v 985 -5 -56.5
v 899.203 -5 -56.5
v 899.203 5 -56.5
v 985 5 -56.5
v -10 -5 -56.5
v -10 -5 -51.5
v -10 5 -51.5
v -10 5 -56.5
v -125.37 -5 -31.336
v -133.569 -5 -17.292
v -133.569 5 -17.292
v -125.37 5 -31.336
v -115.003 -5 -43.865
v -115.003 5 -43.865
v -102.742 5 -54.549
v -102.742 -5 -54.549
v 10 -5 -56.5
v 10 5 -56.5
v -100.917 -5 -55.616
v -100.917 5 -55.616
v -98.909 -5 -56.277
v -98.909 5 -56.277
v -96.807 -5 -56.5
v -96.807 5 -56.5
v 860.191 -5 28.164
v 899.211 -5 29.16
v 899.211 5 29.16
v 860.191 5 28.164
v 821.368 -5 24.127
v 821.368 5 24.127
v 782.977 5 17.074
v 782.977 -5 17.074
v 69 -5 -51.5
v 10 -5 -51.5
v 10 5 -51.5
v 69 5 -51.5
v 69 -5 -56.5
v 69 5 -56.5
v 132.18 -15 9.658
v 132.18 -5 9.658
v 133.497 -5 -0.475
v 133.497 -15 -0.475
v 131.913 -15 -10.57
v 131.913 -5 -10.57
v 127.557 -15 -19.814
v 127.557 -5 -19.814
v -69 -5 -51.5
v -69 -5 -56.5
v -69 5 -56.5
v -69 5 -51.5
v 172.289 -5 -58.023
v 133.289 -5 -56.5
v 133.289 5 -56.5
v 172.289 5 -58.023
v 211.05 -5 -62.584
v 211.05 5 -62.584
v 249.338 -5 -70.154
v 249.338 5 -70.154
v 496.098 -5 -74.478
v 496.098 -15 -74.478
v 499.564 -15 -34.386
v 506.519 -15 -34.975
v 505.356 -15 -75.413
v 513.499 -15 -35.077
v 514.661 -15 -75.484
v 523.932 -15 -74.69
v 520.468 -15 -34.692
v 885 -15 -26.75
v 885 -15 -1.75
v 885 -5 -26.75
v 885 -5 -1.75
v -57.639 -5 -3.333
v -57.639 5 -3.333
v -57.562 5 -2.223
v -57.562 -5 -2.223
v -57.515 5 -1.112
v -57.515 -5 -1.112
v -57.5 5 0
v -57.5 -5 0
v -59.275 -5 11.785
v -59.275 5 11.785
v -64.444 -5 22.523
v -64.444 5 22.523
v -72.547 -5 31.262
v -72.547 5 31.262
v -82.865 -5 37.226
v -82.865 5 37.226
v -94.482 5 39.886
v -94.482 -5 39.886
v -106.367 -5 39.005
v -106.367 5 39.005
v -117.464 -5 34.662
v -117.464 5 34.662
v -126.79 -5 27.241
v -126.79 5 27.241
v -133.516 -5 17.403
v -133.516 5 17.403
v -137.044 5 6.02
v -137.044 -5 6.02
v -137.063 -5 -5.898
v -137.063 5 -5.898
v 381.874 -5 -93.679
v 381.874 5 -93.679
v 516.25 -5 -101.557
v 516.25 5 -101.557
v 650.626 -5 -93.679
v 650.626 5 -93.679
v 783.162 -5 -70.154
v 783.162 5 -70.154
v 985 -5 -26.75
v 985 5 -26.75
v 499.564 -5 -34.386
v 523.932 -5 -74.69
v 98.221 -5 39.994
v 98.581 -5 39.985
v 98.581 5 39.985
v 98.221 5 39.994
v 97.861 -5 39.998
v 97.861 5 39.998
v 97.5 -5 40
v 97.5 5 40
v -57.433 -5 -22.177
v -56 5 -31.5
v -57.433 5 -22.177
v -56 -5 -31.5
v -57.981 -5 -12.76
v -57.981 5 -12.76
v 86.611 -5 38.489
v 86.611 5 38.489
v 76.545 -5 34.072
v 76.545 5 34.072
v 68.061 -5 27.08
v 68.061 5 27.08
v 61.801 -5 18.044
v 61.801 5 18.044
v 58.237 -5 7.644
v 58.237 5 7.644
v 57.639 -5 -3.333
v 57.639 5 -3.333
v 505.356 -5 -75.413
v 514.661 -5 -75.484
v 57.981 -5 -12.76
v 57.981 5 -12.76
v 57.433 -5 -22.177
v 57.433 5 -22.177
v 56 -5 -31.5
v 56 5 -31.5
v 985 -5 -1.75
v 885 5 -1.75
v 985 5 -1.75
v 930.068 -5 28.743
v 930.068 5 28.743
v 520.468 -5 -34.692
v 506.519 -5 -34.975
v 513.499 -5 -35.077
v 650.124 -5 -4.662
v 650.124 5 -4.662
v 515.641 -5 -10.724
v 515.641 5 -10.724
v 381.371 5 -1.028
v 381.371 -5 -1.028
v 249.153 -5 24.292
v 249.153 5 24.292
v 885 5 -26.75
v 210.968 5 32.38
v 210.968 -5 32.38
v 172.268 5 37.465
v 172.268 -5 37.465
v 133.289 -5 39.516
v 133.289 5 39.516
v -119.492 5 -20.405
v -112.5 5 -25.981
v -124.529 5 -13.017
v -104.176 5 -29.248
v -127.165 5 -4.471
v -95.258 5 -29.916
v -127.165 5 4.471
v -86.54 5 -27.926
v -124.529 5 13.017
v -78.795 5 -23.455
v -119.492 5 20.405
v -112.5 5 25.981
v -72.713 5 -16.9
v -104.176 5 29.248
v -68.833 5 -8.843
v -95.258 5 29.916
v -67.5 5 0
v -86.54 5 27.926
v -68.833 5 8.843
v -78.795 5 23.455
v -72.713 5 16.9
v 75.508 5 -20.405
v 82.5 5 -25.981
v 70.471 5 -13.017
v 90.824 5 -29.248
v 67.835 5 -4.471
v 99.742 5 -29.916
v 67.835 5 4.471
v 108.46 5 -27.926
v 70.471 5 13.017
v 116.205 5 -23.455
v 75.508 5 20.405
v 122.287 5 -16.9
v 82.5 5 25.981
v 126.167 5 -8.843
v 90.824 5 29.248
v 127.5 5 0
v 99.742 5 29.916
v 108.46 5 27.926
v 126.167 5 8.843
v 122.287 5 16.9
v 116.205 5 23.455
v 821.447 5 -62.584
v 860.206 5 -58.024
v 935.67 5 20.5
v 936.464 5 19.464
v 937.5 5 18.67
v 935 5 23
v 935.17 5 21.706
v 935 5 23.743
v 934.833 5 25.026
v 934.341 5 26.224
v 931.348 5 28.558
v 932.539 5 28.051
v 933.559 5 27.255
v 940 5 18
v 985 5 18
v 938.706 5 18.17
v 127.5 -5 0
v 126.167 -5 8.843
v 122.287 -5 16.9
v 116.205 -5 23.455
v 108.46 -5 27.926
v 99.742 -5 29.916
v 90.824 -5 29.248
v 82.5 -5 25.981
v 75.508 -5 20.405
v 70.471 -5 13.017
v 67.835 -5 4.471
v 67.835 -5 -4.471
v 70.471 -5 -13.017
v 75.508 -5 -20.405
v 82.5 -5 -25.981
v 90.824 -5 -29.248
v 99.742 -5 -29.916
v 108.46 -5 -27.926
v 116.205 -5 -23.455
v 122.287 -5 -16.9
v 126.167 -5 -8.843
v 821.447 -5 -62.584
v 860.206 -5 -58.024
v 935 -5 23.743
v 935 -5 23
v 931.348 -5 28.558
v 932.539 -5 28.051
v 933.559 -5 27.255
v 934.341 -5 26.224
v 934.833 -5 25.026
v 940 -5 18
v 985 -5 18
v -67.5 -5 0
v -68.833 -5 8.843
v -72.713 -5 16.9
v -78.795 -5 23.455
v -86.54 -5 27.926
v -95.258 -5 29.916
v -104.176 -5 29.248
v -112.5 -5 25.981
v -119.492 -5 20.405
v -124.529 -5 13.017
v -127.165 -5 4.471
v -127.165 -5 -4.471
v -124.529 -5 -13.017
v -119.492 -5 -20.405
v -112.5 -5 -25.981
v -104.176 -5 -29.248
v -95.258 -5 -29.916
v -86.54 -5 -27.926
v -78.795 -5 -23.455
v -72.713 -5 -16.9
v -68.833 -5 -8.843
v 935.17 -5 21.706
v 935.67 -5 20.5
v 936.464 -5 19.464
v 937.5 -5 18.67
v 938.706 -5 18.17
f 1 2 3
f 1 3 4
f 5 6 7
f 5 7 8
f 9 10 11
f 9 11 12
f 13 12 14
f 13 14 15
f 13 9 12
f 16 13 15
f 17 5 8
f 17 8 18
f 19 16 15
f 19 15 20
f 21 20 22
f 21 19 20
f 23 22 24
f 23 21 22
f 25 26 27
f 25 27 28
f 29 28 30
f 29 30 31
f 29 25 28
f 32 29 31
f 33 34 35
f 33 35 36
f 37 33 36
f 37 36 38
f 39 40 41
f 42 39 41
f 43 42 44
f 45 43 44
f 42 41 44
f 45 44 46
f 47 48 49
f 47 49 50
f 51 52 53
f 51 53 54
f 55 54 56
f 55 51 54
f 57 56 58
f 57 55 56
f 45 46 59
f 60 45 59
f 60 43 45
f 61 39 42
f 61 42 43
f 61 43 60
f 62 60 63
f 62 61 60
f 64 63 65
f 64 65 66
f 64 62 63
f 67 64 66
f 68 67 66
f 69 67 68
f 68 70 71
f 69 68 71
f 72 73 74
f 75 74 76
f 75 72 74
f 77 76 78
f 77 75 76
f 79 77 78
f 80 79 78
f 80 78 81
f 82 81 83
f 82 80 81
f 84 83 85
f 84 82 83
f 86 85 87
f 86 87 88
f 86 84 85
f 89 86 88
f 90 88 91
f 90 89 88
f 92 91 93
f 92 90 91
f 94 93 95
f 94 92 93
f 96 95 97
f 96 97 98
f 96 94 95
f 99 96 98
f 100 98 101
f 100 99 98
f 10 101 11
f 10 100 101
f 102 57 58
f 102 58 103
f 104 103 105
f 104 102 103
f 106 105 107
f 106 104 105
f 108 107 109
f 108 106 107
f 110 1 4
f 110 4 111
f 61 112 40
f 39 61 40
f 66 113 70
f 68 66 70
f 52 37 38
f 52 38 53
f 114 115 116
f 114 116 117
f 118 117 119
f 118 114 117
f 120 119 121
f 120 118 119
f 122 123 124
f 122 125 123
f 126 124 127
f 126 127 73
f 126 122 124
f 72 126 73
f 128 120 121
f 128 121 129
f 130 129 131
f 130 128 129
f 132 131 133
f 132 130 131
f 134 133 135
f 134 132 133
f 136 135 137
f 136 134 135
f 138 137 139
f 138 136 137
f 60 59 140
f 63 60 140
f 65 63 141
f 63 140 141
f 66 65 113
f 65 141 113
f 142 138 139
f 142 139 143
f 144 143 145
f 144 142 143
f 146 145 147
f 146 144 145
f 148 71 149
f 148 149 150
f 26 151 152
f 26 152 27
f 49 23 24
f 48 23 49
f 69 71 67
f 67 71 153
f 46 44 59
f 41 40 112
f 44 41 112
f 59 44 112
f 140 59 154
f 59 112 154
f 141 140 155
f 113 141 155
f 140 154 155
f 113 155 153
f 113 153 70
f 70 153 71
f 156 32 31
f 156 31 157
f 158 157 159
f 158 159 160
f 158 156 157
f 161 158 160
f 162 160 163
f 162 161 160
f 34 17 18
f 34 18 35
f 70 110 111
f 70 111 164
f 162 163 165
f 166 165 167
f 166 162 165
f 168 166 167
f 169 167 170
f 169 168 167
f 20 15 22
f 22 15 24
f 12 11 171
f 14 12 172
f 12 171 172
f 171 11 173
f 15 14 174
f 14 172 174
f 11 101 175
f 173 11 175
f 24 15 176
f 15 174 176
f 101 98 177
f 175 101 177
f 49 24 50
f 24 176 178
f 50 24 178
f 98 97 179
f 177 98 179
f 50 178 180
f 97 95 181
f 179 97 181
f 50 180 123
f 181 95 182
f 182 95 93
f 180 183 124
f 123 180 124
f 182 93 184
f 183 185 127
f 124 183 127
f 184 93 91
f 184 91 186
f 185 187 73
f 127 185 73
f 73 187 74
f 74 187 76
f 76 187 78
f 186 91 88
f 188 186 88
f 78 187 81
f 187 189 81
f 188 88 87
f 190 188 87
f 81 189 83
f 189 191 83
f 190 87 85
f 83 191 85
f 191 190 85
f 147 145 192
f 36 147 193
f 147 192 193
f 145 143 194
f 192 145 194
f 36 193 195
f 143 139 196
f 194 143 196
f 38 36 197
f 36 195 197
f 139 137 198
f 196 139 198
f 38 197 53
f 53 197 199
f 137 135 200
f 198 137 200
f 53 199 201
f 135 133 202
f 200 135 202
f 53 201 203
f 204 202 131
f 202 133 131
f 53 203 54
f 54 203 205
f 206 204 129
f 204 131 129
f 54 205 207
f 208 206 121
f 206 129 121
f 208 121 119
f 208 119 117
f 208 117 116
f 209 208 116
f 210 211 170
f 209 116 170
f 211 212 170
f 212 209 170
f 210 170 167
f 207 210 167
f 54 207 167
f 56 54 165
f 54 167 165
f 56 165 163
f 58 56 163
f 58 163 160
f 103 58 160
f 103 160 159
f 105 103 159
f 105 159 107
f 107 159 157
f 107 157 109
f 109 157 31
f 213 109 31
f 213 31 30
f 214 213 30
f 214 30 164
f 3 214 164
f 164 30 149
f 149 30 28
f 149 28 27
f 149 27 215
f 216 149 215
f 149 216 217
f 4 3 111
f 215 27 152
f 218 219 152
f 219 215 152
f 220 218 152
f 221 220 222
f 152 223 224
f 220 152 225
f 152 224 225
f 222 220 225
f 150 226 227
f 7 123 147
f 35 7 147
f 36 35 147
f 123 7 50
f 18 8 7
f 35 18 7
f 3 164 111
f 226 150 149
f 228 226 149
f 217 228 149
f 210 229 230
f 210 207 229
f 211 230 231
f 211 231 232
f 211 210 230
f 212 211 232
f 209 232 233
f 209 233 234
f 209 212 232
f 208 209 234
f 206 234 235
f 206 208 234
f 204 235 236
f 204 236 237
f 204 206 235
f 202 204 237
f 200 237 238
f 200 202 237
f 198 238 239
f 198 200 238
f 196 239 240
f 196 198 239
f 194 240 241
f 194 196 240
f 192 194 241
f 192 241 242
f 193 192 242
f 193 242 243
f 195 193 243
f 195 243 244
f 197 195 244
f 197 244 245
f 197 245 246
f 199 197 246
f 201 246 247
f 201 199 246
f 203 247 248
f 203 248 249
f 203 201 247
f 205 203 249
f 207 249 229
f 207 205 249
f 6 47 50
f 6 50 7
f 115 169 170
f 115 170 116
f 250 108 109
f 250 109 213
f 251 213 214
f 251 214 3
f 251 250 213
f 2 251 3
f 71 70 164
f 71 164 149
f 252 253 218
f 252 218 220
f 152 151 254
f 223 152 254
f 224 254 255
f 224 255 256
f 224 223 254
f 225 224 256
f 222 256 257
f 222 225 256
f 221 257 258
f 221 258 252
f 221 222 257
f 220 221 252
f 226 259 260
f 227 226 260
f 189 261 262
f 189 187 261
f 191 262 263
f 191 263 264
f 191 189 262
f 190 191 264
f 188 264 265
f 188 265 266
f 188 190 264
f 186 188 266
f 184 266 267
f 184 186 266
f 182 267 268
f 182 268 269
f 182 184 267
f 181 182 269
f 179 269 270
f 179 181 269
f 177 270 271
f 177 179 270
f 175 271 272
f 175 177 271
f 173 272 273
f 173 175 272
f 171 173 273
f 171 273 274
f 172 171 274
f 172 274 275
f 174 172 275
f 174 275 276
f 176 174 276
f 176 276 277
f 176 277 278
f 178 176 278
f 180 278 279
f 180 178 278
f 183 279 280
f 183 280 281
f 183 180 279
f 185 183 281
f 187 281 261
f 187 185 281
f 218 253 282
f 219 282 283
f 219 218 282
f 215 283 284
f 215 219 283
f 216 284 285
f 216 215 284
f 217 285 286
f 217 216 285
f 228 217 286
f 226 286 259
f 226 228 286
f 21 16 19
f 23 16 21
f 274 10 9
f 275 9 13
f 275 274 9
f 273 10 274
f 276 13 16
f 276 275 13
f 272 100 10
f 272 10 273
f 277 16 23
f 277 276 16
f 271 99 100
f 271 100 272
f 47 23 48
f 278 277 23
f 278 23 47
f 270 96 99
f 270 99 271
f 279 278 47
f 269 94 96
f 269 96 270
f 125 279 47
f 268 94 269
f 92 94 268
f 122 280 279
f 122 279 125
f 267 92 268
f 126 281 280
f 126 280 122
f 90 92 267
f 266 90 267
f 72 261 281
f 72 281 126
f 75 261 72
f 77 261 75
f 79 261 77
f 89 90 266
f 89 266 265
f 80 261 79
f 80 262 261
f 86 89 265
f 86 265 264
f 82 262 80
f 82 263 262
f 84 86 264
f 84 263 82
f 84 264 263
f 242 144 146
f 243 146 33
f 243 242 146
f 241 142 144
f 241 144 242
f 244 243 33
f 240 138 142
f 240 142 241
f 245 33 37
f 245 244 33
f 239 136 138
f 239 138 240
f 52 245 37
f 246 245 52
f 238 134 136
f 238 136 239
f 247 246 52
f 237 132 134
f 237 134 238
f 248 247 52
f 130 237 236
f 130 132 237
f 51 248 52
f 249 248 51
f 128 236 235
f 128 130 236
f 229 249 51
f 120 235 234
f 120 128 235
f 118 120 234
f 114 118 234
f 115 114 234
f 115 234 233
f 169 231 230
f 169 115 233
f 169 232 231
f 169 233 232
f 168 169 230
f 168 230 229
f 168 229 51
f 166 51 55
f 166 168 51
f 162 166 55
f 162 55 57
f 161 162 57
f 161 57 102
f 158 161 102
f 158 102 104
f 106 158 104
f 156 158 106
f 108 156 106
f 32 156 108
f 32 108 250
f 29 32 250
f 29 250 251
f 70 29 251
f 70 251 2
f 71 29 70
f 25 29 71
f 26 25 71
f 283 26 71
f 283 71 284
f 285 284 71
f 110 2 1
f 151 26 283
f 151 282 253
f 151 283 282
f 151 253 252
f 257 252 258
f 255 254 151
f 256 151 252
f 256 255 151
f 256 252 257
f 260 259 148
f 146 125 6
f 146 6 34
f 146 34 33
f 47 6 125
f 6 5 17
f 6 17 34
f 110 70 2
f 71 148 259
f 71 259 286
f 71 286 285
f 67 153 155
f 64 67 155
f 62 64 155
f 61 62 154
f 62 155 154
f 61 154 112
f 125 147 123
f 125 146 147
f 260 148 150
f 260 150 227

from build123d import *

# Parameters (mm, degrees)
F0_R     = 30
F1_DEPTH = 5
F3_DEPTH = 10
F4_W     = 50
F4_H     = 52.275077
F5_DEPTH = 25
F6_R     = 5


with BuildPart() as f1:
    # F0 (on Front) → F1 (new body, symmetric)
    with BuildSketch(Plane.XZ):
        with BuildLine():
            ThreePointArc((-57.639096, -3.332913), (-57.534789, -1.667907), (-57.5, 0))
            ThreePointArc((-57.5, 0), (-106.366531, 39.004931), (-133.569231, -17.291922))
            ThreePointArc((-133.569231, -17.291922), (-90.267595, -39.340721), (-57.639096, -3.332913))
        make_face()
        with Locations((-97.5, 0)):
            Circle(F0_R, mode=Mode.SUBTRACT)
        with BuildLine():
            ThreePointArc((98.581492, 39.985377), (98.040796, 39.996344), (97.5, 40))
            Line((97.5, 40), (98.581492, 39.985377))
        make_face()
        with BuildLine():
            ThreePointArc((97.5, 40), (68.06094, 27.080283), (57.639096, -3.332913))
            ThreePointArc((57.639096, -3.332913), (99.167907, -39.965211), (137.5, 0))
            ThreePointArc((137.5, 0), (126.164086, 27.899286), (98.581492, 39.985377))
            Line((98.581492, 39.985377), (97.5, 40))
        make_face()
        with Locations((97.5, 0)):
            Circle(F0_R, mode=Mode.SUBTRACT)
        with BuildLine():
            ThreePointArc((-57.639096, -3.332913), (-90.267595, -39.340721), (-133.569231, -17.291922))
            ThreePointArc((-133.569231, -17.291922), (-120.441501, -37.81174), (-102.741898, -54.548654))
            ThreePointArc((-102.741898, -54.548654), (-99.9309, -55.999646), (-96.807324, -56.5))
            Line((-96.807324, -56.5), (-69, -56.5))
            Line((-69, -56.5), (-69, -51.5))
            Line((-69, -51.5), (-10, -51.5))
            Line((-10, -51.5), (-10, -56.5))
            Line((-10, -56.5), (0, -56.5))
            Line((0, -56.5), (0, -31.5))
            Line((0, -31.5), (-56, -31.5))
            ThreePointArc((-56, -31.5), (-57.817949, -17.474555), (-57.639096, -3.332913))
        make_face()
        with BuildLine():
            Line((56, -31.5), (0, -31.5))
            Line((0, -31.5), (0, -56.5))
            Line((0, -56.5), (10, -56.5))
            Line((10, -56.5), (10, -51.5))
            Line((10, -51.5), (69, -51.5))
            Line((69, -51.5), (69, -56.5))
            Line((69, -56.5), (133.289386, -56.5))
            ThreePointArc((133.289386, -56.5), (191.713948, -59.925161), (249.338057, -70.153718))
            ThreePointArc((249.338057, -70.153718), (516.25, -101.55727), (783.161943, -70.153718))
            ThreePointArc((783.161943, -70.153718), (840.782267, -59.925607), (899.202992, -56.5))
            Line((899.202992, -56.5), (985, -56.5))
            Line((985, -56.5), (985, -26.75))
            Line((985, -26.75), (885, -26.75))
            Line((885, -26.75), (885, -1.75))
            Line((885, -1.75), (985, -1.75))
            Line((985, -1.75), (985, 28))
            Line((985, 28), (899.210834, 29.159966))
            ThreePointArc((899.210834, 29.159966), (840.739846, 26.524444), (782.977465, 17.074059))
            ThreePointArc((782.977465, 17.074059), (515.640717, -10.723528), (249.153273, 24.291963))
            ThreePointArc((249.153273, 24.291963), (191.667521, 35.300633), (133.289166, 39.51609))
            Line((133.289166, 39.51609), (98.581492, 39.985377))
            ThreePointArc((98.581492, 39.985377), (126.164086, 27.899286), (137.5, 0))
            ThreePointArc((137.5, 0), (99.167907, -39.965211), (57.639096, -3.332913))
            ThreePointArc((57.639096, -3.332913), (57.817949, -17.474555), (56, -31.5))
        make_face()
    extrude(amount=F1_DEPTH, both=True)

    # F4 (on face) → F5 (cut)
    with BuildSketch(Plane.XZ.offset(5)):
        with Locations((960, 44.137538)):
            Rectangle(F4_W, F4_H)
    extrude(amount=-F5_DEPTH, mode=Mode.SUBTRACT)

    # F6
    f6_edges = [f1.edges().sort_by_distance(p)[0] for p in [
        (935, 0, 18),
        (935, 0, 28.676056),
    ]]
    fillet(f6_edges, radius=F6_R)


with BuildPart() as f3:
    # F2 (on face) → F3 (new body)
    with BuildSketch(Plane.XZ.offset(5)):
        with BuildLine():
            Line((885, -26.75), (885, -1.75))
            Line((885, -1.75), (520.46777, -34.691635))
            ThreePointArc((520.46777, -34.691635), (510.008041, -35.086805), (499.564304, -34.386471))
            Line((499.564304, -34.386471), (132.180281, 9.65806))
            ThreePointArc((132.180281, 9.65806), (133.065016, -5.579392), (127.556756, -19.81392))
            Line((127.556756, -19.81392), (496.098009, -74.477892))
            ThreePointArc((496.098009, -74.477892), (510.007494, -75.55718), (523.93182, -74.690138))
            Line((523.93182, -74.690138), (885, -26.75))
        make_face()
    extrude(amount=F3_DEPTH)


solid = Compound([f1.part, f3.part])
